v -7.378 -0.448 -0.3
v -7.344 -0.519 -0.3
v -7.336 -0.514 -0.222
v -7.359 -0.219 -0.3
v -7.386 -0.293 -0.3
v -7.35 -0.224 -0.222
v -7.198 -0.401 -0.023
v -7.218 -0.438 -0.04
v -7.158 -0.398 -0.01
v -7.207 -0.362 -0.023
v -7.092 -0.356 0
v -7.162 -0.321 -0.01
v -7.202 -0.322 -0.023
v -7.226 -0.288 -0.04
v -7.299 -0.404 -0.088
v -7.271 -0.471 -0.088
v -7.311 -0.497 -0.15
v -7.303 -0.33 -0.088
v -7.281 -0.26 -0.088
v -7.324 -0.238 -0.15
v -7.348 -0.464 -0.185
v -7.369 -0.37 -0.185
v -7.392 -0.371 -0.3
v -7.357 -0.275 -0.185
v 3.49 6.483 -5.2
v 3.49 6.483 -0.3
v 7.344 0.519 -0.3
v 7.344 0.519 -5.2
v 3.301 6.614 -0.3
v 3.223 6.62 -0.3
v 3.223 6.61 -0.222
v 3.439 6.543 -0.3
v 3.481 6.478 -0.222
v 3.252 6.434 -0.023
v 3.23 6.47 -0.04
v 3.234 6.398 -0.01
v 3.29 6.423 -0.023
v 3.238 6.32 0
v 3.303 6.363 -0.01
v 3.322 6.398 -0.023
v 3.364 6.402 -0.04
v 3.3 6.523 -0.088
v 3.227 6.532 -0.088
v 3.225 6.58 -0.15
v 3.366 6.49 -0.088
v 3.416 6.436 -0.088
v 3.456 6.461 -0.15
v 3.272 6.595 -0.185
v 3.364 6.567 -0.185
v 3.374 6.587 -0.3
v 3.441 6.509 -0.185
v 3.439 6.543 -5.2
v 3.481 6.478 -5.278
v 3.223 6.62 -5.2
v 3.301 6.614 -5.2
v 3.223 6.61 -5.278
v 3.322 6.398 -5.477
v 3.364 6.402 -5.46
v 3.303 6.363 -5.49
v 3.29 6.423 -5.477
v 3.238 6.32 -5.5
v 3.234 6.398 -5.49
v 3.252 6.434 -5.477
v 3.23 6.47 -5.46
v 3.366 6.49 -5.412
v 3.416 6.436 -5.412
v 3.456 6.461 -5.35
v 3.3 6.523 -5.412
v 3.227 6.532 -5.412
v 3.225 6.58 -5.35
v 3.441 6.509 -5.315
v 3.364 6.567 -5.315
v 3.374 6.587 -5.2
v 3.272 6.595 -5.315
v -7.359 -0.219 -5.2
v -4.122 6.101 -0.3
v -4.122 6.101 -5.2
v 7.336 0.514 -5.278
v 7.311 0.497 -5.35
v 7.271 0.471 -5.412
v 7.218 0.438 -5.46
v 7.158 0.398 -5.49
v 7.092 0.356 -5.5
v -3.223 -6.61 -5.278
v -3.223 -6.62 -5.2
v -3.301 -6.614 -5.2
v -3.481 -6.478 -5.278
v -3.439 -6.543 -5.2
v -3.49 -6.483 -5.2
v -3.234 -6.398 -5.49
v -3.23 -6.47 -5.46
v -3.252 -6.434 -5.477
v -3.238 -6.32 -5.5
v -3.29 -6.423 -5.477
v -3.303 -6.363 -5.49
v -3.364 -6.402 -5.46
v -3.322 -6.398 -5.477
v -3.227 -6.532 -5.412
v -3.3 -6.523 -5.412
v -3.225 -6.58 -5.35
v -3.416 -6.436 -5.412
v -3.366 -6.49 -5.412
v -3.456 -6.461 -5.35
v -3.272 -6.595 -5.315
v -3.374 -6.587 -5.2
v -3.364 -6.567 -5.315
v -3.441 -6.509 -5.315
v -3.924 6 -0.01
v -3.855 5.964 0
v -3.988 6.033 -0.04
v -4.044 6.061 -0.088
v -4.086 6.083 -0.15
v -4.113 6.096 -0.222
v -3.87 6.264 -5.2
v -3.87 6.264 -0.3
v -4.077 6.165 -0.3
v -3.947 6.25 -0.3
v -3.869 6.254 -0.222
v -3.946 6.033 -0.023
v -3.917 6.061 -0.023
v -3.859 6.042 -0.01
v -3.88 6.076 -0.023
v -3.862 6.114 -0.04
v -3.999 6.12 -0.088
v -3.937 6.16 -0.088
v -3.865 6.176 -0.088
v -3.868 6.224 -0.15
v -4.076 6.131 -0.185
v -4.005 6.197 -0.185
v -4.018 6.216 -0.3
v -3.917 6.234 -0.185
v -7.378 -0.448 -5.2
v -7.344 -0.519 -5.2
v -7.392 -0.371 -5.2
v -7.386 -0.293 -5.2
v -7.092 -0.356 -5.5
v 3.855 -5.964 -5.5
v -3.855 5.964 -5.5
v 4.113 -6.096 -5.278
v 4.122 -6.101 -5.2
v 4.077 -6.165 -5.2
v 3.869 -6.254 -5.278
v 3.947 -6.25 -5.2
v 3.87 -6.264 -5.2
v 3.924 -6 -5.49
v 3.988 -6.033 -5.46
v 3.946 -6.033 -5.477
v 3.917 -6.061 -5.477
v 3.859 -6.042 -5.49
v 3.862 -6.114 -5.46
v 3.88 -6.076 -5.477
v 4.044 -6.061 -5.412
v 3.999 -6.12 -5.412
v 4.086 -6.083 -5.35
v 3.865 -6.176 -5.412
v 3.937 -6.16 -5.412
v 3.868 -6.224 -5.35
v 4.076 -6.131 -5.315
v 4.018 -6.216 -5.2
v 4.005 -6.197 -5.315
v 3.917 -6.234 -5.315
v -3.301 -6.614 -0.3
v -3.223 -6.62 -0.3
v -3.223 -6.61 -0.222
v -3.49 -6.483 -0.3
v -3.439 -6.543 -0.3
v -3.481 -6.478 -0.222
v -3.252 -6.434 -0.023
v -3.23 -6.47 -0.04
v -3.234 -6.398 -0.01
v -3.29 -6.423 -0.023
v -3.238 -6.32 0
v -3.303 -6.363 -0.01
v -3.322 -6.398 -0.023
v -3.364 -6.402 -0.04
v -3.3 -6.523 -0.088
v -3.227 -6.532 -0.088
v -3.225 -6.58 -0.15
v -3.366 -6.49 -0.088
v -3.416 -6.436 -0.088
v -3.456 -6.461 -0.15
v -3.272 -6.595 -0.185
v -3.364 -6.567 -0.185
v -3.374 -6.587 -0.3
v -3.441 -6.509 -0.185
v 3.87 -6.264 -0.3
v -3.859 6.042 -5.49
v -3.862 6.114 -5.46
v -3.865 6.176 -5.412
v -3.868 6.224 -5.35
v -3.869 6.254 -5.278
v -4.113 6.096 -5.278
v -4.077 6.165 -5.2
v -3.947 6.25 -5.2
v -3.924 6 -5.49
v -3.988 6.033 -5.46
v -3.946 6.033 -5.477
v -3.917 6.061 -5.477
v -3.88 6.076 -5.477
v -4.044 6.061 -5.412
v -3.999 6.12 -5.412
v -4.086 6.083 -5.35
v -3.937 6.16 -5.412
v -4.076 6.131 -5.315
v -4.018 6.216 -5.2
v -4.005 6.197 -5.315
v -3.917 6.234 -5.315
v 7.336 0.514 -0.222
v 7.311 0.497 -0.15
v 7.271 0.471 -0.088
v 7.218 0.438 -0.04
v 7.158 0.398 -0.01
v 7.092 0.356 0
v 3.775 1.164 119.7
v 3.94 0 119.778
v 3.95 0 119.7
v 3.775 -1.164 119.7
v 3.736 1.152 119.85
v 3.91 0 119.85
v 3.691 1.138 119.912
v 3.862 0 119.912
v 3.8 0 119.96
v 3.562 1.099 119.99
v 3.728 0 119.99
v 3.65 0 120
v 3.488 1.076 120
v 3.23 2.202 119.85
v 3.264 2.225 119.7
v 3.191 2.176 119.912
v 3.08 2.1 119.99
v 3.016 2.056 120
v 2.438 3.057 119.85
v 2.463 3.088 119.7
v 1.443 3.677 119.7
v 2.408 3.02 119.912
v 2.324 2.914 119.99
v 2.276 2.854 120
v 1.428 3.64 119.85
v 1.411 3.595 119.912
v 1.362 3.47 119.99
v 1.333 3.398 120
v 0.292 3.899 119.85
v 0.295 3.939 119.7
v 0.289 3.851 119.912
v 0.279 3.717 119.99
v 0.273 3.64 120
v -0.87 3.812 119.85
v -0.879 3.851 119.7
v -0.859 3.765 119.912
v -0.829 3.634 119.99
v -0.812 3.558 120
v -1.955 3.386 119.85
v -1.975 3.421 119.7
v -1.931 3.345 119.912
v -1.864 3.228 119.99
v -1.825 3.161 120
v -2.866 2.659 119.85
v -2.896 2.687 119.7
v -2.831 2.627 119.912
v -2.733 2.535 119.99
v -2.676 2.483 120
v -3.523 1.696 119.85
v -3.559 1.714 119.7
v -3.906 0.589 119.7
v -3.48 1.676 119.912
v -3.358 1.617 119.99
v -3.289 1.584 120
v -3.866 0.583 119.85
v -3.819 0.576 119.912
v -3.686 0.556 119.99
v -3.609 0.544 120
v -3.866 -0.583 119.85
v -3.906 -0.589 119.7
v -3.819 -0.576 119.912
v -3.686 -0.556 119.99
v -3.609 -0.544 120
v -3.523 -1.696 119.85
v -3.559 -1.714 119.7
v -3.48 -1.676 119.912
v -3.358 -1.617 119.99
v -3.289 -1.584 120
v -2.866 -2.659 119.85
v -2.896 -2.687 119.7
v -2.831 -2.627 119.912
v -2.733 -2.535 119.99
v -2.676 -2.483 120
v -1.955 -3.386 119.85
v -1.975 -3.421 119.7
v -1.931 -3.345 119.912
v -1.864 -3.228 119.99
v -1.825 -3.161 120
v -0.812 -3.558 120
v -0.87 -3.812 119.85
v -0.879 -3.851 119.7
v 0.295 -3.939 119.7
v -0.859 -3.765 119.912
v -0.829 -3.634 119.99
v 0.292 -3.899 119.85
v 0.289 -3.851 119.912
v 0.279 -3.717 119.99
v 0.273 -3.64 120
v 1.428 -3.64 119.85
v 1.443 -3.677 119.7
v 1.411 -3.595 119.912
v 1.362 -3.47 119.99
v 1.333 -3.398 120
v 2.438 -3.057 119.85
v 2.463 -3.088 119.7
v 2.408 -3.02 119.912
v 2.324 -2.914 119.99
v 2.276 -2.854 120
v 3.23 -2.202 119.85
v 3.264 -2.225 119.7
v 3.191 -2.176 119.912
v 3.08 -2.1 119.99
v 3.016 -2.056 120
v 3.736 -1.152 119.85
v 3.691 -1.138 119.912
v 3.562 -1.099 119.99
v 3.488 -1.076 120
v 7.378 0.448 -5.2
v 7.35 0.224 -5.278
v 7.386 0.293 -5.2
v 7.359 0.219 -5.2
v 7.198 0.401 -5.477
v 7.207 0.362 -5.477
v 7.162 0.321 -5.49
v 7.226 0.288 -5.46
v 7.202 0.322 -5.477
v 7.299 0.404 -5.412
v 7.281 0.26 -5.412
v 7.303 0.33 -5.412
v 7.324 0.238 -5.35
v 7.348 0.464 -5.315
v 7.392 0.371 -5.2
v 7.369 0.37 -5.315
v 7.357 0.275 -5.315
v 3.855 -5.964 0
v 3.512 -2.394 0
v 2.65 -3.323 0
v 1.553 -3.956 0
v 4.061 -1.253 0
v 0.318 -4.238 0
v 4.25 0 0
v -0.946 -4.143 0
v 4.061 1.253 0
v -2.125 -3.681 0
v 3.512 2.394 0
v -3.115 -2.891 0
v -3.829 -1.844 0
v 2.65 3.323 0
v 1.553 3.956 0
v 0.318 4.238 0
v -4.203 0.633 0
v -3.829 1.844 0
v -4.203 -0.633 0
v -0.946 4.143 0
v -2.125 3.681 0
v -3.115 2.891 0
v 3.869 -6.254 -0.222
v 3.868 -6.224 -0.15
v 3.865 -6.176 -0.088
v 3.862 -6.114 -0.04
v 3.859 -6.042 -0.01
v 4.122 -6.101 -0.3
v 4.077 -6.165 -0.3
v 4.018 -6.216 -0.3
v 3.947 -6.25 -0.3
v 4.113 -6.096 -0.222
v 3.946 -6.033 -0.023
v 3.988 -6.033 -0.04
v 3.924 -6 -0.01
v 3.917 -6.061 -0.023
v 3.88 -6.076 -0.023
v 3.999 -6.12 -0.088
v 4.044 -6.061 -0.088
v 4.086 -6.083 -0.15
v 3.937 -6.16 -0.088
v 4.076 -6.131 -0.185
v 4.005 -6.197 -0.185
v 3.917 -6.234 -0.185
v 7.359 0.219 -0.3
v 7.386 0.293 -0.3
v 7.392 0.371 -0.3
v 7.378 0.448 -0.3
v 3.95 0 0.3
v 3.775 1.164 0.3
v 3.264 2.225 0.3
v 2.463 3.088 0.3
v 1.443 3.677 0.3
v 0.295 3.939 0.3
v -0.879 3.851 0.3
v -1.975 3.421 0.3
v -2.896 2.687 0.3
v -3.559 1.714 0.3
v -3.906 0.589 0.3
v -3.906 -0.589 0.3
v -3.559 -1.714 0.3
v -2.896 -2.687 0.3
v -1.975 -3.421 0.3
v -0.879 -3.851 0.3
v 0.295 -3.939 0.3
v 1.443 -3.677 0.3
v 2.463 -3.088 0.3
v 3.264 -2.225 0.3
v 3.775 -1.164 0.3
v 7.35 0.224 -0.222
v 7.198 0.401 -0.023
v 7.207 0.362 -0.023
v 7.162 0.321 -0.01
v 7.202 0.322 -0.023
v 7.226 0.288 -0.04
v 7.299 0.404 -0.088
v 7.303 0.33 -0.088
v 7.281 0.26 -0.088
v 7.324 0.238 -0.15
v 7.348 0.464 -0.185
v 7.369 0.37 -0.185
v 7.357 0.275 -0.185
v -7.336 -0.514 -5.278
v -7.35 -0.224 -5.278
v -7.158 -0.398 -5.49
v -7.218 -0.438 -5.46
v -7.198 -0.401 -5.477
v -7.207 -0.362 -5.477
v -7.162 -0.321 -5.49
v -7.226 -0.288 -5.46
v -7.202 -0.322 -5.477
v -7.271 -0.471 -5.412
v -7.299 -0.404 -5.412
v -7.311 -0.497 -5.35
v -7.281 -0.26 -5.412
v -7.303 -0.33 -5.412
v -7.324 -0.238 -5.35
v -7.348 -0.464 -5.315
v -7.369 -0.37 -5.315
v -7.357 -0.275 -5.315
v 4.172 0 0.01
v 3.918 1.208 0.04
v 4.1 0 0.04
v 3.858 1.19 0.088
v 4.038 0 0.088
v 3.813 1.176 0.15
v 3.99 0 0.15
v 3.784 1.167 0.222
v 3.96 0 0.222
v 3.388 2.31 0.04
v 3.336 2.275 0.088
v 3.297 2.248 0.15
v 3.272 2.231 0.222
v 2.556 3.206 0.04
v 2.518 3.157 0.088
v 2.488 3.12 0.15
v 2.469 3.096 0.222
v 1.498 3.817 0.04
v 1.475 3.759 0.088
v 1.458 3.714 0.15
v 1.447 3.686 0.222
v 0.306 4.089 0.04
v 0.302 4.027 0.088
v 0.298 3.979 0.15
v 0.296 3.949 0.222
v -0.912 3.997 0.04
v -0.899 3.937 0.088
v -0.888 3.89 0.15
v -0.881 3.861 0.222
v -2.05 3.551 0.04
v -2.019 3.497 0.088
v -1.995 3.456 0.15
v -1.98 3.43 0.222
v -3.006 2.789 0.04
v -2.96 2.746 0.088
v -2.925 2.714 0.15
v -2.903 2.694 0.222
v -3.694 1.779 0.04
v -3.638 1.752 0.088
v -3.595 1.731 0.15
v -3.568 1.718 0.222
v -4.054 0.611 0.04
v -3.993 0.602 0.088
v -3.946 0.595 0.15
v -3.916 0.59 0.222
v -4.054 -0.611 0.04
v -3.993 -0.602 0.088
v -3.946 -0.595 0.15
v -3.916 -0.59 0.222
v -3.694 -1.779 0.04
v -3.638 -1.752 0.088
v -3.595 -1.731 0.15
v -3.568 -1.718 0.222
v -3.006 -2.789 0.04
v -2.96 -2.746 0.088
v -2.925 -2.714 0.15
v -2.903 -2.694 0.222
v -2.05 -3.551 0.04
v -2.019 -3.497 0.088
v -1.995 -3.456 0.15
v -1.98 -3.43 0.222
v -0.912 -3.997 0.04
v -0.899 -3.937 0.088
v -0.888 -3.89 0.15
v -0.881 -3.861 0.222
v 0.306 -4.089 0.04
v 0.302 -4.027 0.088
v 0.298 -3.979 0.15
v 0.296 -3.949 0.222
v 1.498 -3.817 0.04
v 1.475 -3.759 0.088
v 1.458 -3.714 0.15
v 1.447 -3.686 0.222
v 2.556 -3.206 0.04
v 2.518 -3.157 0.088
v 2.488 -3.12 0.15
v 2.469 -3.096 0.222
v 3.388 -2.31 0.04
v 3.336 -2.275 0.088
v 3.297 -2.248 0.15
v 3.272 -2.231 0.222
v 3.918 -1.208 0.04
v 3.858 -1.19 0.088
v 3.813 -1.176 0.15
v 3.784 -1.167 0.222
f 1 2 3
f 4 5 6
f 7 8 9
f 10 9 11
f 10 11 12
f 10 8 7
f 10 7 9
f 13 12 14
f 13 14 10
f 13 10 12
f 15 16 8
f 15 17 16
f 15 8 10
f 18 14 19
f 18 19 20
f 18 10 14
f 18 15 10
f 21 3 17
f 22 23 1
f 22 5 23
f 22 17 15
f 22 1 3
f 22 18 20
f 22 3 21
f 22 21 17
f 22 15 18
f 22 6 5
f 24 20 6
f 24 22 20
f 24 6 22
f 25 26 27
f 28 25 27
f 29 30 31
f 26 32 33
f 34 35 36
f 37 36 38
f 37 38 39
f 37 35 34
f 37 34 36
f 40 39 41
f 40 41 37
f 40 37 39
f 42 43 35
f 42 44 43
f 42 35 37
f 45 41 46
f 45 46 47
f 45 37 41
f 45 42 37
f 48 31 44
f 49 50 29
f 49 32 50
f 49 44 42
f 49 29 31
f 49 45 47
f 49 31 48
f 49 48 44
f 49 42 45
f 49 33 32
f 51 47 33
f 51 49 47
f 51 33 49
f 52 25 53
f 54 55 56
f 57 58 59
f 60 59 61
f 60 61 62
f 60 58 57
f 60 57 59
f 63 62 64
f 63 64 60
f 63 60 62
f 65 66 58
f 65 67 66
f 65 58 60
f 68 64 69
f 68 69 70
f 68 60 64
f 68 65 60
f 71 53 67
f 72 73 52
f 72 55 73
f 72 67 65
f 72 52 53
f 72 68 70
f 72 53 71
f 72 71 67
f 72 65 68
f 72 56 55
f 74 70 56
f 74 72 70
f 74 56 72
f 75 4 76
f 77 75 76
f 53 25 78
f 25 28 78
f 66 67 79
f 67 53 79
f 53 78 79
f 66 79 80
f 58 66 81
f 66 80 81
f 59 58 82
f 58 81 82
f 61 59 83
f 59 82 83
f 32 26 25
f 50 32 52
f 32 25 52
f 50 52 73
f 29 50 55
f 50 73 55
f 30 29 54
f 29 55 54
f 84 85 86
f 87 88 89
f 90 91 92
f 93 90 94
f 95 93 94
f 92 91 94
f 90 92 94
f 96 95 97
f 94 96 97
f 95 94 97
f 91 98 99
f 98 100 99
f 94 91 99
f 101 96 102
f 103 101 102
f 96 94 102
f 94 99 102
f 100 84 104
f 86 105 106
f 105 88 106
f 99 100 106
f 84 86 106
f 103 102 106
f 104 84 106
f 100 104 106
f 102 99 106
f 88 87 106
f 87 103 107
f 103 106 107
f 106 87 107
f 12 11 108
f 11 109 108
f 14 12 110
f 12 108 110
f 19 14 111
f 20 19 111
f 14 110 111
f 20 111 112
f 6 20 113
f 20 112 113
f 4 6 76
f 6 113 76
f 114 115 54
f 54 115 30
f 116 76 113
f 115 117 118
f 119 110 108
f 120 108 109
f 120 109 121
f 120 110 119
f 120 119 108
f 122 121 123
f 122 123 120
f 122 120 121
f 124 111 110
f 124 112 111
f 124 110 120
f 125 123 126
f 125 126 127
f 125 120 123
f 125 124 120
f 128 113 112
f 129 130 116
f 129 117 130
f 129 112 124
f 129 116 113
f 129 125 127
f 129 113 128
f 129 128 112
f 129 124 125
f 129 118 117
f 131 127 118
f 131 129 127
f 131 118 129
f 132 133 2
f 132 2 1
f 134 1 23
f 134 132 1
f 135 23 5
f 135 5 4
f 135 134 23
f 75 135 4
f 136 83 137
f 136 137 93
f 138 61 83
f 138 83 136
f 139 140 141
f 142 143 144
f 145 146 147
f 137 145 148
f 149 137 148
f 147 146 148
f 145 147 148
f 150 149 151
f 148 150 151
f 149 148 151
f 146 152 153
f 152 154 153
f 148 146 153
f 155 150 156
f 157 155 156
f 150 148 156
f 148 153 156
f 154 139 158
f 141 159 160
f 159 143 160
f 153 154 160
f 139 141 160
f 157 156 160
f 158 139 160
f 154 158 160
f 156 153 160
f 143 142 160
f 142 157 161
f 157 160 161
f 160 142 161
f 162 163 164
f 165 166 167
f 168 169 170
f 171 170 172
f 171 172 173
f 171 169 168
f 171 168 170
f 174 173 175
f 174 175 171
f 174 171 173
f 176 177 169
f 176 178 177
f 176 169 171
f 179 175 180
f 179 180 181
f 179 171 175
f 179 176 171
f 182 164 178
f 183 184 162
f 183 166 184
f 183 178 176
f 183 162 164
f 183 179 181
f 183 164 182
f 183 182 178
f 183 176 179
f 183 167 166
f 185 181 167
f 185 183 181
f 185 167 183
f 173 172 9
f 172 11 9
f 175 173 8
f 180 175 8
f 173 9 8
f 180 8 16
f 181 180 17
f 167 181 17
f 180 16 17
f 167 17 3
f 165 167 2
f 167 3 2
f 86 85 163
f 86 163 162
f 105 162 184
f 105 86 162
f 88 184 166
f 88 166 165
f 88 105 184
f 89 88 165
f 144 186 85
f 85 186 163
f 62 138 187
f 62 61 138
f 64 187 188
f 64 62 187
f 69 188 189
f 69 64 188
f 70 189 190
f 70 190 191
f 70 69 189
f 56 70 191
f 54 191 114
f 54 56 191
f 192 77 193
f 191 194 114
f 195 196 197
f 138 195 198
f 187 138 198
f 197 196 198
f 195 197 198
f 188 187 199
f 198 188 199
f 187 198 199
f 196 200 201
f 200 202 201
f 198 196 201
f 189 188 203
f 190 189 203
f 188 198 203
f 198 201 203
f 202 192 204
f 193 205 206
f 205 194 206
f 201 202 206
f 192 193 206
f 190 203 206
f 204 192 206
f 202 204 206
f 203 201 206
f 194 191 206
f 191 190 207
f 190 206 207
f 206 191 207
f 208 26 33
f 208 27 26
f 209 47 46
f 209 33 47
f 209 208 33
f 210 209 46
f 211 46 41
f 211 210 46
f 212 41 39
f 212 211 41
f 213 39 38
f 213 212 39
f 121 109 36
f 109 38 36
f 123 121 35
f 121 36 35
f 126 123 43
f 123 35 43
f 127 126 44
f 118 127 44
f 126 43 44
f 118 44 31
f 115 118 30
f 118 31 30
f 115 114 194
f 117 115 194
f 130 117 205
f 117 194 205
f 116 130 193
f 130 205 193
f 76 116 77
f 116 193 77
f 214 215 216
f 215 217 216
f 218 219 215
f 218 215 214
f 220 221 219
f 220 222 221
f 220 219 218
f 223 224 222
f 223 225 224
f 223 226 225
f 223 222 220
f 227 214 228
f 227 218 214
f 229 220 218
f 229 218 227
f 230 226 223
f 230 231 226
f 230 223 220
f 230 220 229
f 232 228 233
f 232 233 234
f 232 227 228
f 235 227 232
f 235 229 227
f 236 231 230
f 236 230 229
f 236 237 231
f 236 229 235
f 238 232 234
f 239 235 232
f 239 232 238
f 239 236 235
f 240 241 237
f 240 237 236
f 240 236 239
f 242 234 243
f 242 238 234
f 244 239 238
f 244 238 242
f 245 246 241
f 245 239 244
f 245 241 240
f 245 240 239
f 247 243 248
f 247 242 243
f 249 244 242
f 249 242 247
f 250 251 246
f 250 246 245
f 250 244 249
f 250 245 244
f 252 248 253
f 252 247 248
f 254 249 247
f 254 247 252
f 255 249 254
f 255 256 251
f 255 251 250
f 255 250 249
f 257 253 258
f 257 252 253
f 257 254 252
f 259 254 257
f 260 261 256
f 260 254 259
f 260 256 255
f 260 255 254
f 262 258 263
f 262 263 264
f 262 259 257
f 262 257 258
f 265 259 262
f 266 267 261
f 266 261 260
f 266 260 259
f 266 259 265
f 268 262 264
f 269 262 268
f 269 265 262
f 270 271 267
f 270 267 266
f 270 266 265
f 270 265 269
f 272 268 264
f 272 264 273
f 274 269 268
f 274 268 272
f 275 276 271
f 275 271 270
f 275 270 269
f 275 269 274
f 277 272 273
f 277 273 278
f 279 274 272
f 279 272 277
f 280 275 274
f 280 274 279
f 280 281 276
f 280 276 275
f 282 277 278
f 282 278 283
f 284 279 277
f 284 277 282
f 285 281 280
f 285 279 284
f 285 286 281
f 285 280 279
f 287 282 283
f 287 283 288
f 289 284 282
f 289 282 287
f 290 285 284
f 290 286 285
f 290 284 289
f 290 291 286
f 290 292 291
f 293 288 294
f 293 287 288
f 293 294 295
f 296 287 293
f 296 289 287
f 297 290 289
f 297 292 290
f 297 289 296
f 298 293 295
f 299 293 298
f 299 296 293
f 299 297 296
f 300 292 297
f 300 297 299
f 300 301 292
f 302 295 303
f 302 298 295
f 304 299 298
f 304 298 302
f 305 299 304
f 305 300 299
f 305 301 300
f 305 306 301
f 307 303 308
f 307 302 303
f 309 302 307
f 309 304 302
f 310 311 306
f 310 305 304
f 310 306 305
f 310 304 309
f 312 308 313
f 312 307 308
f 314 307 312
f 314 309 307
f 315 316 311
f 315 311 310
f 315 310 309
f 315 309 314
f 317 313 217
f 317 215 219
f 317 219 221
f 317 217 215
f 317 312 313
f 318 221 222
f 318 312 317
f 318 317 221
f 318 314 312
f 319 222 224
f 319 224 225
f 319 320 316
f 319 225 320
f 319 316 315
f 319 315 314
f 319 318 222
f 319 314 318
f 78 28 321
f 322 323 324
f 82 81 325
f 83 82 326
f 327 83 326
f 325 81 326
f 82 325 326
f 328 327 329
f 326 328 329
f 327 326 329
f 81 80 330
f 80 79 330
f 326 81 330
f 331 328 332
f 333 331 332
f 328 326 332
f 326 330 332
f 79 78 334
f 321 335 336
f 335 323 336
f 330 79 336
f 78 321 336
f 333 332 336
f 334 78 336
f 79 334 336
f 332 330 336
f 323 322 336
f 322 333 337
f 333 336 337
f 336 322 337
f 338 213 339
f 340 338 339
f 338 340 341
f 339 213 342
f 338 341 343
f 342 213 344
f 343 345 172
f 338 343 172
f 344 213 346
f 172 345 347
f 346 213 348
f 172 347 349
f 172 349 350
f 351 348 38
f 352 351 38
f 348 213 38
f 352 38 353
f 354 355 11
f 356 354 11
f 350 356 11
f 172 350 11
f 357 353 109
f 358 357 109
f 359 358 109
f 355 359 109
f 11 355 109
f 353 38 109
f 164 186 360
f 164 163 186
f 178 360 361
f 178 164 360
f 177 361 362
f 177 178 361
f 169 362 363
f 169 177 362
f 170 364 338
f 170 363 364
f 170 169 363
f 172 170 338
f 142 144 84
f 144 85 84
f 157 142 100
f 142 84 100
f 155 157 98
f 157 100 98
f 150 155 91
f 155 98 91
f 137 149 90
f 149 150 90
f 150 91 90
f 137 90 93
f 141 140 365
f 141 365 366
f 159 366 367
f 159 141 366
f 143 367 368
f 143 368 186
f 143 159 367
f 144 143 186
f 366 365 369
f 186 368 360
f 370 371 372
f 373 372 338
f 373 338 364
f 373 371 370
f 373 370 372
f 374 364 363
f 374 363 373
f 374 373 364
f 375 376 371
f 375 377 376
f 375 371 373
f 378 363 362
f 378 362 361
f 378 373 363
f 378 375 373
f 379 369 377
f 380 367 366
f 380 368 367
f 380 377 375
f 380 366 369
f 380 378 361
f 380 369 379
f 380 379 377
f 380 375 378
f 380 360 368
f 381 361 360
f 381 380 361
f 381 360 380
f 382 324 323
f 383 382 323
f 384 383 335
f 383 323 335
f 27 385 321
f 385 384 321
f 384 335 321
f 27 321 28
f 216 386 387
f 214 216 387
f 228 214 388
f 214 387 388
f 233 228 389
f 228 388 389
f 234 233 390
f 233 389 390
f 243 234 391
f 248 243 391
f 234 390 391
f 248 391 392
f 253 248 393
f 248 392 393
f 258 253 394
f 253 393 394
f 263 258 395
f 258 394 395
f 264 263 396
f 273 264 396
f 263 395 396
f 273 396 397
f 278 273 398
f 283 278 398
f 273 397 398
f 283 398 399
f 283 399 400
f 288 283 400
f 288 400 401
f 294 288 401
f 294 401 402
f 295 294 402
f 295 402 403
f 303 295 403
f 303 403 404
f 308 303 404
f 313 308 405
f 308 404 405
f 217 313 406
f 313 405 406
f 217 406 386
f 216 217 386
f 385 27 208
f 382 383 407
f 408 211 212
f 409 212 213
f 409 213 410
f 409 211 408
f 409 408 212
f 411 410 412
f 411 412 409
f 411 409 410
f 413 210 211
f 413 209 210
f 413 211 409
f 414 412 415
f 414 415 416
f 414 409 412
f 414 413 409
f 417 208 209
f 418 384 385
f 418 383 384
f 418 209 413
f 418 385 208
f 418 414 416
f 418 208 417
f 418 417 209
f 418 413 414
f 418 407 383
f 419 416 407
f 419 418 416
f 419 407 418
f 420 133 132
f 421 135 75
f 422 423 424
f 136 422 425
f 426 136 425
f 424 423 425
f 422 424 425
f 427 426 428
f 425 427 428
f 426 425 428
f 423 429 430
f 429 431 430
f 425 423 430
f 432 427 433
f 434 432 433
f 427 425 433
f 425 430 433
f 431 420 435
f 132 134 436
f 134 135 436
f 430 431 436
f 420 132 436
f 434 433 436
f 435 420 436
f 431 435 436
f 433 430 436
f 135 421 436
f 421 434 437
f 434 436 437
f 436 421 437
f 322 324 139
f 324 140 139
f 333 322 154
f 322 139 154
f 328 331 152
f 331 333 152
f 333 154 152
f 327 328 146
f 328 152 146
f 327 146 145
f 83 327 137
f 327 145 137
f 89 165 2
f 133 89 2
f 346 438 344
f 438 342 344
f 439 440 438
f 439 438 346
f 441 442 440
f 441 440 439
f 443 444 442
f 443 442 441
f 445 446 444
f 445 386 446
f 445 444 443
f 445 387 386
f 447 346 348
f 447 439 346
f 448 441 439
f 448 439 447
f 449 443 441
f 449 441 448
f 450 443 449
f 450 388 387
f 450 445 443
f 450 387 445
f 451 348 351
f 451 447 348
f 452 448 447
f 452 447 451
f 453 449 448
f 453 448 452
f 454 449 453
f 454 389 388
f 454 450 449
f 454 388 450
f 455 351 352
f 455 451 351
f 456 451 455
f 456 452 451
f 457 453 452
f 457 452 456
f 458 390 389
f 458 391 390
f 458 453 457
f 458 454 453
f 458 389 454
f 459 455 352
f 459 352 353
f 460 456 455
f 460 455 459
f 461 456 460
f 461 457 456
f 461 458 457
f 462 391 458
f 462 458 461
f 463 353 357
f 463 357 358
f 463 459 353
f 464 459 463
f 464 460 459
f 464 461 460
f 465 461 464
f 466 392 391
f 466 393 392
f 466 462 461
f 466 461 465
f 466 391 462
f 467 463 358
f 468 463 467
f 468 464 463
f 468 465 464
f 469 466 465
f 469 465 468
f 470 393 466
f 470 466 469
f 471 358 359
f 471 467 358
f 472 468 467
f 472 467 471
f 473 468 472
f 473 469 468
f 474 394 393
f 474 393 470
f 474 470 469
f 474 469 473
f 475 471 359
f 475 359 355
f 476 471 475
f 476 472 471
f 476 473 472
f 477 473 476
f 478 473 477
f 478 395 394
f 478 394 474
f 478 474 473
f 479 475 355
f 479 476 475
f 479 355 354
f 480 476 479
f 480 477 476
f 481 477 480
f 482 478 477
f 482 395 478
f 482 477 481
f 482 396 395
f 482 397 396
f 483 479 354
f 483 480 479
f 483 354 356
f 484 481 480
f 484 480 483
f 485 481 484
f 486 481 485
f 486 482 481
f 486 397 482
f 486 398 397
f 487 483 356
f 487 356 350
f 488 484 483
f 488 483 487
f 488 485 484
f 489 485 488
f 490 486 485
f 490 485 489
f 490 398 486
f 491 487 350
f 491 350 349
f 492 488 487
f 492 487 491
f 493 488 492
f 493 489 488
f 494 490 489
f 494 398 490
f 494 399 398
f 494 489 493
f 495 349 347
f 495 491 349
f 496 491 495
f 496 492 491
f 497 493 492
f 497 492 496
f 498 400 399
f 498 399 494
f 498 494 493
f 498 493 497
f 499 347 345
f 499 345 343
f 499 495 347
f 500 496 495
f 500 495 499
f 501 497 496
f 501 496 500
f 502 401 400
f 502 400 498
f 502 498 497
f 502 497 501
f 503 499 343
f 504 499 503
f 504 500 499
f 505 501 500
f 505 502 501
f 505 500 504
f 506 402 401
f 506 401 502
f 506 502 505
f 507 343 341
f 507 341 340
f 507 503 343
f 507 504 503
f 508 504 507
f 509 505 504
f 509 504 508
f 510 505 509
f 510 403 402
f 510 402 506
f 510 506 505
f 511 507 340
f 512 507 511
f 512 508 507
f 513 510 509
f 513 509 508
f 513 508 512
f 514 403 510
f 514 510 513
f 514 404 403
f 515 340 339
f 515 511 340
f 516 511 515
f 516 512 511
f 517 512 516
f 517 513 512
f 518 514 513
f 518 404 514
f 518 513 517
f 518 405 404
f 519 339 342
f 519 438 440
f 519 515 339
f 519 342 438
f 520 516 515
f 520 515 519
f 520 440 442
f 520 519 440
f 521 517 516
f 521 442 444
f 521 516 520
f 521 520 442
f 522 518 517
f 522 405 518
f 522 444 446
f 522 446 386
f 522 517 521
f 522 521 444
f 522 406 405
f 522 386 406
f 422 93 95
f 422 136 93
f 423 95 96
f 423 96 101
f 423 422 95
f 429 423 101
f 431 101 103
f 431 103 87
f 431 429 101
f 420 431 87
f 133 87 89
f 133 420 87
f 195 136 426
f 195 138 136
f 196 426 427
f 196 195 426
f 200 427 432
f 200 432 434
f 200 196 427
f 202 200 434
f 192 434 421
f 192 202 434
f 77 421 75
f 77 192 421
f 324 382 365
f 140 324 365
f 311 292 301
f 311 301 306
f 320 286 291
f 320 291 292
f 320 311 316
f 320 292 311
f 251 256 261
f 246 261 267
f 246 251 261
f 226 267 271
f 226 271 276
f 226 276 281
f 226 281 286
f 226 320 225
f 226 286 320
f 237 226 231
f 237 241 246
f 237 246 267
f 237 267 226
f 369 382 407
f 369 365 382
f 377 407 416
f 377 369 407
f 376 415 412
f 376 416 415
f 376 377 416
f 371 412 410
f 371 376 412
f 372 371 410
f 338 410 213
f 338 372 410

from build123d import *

# Parameters (mm, degrees)
SKETCH_1_R      = 3.95
EXTRUDE_1_DEPTH = 120
EXTRUDE_2_DEPTH = 5.5
FILLET_1_R      = 0.3


with BuildPart() as part:
    # Эскиз1 → Бобышка-Вытянуть1 (new body)
    with BuildSketch(Plane.XY):
        Circle(SKETCH_1_R)
    extrude(amount=EXTRUDE_1_DEPTH)

    # Эскиз2 → Бобышка-Вытянуть2 (add)
    with BuildSketch(Plane(origin=(0, 0, 0), x_dir=(-1, 0, 0), z_dir=(0, 0, -1))):
        Polygon((-7.438440775, 0.373629267), (-4.042792825, -6.255064042), (3.395647951, -6.62869331), (7.438440775, -0.373629267), (4.042792825, 6.255064042), (-3.395647951, 6.62869331), align=None)
    extrude(amount=EXTRUDE_2_DEPTH)

    # Скругление1
    fillet_1_edges = [part.edges().sort_by_distance(p)[0] for p in [
        (-3.95, 0, 120),
        (-3.95, 0, 0),
        (5.417044363, 3.501161289, 0),
        (3.395647951, 6.62869331, -2.75),
        (5.7406168, -2.940717387, 0),
        (7.438440775, 0.373629267, -2.75),
        (0.323572437, -6.441878676, 0),
        (4.042792825, -6.255064042, -2.75),
        (-5.417044363, -3.501161289, 0),
        (-3.395647951, -6.62869331, -2.75),
        (-5.7406168, 2.940717387, 0),
        (-7.438440775, -0.373629267, -2.75),
        (-0.323572437, 6.441878676, 0),
        (-4.042792825, 6.255064042, -2.75),
        (5.417044363, 3.501161289, -5.5),
        (5.7406168, -2.940717387, -5.5),
        (0.323572437, -6.441878676, -5.5),
        (-5.417044363, -3.501161289, -5.5),
        (-5.7406168, 2.940717387, -5.5),
        (-0.323572437, 6.441878676, -5.5),
    ]]
    fillet(fillet_1_edges, radius=FILLET_1_R)


solid = part.part
